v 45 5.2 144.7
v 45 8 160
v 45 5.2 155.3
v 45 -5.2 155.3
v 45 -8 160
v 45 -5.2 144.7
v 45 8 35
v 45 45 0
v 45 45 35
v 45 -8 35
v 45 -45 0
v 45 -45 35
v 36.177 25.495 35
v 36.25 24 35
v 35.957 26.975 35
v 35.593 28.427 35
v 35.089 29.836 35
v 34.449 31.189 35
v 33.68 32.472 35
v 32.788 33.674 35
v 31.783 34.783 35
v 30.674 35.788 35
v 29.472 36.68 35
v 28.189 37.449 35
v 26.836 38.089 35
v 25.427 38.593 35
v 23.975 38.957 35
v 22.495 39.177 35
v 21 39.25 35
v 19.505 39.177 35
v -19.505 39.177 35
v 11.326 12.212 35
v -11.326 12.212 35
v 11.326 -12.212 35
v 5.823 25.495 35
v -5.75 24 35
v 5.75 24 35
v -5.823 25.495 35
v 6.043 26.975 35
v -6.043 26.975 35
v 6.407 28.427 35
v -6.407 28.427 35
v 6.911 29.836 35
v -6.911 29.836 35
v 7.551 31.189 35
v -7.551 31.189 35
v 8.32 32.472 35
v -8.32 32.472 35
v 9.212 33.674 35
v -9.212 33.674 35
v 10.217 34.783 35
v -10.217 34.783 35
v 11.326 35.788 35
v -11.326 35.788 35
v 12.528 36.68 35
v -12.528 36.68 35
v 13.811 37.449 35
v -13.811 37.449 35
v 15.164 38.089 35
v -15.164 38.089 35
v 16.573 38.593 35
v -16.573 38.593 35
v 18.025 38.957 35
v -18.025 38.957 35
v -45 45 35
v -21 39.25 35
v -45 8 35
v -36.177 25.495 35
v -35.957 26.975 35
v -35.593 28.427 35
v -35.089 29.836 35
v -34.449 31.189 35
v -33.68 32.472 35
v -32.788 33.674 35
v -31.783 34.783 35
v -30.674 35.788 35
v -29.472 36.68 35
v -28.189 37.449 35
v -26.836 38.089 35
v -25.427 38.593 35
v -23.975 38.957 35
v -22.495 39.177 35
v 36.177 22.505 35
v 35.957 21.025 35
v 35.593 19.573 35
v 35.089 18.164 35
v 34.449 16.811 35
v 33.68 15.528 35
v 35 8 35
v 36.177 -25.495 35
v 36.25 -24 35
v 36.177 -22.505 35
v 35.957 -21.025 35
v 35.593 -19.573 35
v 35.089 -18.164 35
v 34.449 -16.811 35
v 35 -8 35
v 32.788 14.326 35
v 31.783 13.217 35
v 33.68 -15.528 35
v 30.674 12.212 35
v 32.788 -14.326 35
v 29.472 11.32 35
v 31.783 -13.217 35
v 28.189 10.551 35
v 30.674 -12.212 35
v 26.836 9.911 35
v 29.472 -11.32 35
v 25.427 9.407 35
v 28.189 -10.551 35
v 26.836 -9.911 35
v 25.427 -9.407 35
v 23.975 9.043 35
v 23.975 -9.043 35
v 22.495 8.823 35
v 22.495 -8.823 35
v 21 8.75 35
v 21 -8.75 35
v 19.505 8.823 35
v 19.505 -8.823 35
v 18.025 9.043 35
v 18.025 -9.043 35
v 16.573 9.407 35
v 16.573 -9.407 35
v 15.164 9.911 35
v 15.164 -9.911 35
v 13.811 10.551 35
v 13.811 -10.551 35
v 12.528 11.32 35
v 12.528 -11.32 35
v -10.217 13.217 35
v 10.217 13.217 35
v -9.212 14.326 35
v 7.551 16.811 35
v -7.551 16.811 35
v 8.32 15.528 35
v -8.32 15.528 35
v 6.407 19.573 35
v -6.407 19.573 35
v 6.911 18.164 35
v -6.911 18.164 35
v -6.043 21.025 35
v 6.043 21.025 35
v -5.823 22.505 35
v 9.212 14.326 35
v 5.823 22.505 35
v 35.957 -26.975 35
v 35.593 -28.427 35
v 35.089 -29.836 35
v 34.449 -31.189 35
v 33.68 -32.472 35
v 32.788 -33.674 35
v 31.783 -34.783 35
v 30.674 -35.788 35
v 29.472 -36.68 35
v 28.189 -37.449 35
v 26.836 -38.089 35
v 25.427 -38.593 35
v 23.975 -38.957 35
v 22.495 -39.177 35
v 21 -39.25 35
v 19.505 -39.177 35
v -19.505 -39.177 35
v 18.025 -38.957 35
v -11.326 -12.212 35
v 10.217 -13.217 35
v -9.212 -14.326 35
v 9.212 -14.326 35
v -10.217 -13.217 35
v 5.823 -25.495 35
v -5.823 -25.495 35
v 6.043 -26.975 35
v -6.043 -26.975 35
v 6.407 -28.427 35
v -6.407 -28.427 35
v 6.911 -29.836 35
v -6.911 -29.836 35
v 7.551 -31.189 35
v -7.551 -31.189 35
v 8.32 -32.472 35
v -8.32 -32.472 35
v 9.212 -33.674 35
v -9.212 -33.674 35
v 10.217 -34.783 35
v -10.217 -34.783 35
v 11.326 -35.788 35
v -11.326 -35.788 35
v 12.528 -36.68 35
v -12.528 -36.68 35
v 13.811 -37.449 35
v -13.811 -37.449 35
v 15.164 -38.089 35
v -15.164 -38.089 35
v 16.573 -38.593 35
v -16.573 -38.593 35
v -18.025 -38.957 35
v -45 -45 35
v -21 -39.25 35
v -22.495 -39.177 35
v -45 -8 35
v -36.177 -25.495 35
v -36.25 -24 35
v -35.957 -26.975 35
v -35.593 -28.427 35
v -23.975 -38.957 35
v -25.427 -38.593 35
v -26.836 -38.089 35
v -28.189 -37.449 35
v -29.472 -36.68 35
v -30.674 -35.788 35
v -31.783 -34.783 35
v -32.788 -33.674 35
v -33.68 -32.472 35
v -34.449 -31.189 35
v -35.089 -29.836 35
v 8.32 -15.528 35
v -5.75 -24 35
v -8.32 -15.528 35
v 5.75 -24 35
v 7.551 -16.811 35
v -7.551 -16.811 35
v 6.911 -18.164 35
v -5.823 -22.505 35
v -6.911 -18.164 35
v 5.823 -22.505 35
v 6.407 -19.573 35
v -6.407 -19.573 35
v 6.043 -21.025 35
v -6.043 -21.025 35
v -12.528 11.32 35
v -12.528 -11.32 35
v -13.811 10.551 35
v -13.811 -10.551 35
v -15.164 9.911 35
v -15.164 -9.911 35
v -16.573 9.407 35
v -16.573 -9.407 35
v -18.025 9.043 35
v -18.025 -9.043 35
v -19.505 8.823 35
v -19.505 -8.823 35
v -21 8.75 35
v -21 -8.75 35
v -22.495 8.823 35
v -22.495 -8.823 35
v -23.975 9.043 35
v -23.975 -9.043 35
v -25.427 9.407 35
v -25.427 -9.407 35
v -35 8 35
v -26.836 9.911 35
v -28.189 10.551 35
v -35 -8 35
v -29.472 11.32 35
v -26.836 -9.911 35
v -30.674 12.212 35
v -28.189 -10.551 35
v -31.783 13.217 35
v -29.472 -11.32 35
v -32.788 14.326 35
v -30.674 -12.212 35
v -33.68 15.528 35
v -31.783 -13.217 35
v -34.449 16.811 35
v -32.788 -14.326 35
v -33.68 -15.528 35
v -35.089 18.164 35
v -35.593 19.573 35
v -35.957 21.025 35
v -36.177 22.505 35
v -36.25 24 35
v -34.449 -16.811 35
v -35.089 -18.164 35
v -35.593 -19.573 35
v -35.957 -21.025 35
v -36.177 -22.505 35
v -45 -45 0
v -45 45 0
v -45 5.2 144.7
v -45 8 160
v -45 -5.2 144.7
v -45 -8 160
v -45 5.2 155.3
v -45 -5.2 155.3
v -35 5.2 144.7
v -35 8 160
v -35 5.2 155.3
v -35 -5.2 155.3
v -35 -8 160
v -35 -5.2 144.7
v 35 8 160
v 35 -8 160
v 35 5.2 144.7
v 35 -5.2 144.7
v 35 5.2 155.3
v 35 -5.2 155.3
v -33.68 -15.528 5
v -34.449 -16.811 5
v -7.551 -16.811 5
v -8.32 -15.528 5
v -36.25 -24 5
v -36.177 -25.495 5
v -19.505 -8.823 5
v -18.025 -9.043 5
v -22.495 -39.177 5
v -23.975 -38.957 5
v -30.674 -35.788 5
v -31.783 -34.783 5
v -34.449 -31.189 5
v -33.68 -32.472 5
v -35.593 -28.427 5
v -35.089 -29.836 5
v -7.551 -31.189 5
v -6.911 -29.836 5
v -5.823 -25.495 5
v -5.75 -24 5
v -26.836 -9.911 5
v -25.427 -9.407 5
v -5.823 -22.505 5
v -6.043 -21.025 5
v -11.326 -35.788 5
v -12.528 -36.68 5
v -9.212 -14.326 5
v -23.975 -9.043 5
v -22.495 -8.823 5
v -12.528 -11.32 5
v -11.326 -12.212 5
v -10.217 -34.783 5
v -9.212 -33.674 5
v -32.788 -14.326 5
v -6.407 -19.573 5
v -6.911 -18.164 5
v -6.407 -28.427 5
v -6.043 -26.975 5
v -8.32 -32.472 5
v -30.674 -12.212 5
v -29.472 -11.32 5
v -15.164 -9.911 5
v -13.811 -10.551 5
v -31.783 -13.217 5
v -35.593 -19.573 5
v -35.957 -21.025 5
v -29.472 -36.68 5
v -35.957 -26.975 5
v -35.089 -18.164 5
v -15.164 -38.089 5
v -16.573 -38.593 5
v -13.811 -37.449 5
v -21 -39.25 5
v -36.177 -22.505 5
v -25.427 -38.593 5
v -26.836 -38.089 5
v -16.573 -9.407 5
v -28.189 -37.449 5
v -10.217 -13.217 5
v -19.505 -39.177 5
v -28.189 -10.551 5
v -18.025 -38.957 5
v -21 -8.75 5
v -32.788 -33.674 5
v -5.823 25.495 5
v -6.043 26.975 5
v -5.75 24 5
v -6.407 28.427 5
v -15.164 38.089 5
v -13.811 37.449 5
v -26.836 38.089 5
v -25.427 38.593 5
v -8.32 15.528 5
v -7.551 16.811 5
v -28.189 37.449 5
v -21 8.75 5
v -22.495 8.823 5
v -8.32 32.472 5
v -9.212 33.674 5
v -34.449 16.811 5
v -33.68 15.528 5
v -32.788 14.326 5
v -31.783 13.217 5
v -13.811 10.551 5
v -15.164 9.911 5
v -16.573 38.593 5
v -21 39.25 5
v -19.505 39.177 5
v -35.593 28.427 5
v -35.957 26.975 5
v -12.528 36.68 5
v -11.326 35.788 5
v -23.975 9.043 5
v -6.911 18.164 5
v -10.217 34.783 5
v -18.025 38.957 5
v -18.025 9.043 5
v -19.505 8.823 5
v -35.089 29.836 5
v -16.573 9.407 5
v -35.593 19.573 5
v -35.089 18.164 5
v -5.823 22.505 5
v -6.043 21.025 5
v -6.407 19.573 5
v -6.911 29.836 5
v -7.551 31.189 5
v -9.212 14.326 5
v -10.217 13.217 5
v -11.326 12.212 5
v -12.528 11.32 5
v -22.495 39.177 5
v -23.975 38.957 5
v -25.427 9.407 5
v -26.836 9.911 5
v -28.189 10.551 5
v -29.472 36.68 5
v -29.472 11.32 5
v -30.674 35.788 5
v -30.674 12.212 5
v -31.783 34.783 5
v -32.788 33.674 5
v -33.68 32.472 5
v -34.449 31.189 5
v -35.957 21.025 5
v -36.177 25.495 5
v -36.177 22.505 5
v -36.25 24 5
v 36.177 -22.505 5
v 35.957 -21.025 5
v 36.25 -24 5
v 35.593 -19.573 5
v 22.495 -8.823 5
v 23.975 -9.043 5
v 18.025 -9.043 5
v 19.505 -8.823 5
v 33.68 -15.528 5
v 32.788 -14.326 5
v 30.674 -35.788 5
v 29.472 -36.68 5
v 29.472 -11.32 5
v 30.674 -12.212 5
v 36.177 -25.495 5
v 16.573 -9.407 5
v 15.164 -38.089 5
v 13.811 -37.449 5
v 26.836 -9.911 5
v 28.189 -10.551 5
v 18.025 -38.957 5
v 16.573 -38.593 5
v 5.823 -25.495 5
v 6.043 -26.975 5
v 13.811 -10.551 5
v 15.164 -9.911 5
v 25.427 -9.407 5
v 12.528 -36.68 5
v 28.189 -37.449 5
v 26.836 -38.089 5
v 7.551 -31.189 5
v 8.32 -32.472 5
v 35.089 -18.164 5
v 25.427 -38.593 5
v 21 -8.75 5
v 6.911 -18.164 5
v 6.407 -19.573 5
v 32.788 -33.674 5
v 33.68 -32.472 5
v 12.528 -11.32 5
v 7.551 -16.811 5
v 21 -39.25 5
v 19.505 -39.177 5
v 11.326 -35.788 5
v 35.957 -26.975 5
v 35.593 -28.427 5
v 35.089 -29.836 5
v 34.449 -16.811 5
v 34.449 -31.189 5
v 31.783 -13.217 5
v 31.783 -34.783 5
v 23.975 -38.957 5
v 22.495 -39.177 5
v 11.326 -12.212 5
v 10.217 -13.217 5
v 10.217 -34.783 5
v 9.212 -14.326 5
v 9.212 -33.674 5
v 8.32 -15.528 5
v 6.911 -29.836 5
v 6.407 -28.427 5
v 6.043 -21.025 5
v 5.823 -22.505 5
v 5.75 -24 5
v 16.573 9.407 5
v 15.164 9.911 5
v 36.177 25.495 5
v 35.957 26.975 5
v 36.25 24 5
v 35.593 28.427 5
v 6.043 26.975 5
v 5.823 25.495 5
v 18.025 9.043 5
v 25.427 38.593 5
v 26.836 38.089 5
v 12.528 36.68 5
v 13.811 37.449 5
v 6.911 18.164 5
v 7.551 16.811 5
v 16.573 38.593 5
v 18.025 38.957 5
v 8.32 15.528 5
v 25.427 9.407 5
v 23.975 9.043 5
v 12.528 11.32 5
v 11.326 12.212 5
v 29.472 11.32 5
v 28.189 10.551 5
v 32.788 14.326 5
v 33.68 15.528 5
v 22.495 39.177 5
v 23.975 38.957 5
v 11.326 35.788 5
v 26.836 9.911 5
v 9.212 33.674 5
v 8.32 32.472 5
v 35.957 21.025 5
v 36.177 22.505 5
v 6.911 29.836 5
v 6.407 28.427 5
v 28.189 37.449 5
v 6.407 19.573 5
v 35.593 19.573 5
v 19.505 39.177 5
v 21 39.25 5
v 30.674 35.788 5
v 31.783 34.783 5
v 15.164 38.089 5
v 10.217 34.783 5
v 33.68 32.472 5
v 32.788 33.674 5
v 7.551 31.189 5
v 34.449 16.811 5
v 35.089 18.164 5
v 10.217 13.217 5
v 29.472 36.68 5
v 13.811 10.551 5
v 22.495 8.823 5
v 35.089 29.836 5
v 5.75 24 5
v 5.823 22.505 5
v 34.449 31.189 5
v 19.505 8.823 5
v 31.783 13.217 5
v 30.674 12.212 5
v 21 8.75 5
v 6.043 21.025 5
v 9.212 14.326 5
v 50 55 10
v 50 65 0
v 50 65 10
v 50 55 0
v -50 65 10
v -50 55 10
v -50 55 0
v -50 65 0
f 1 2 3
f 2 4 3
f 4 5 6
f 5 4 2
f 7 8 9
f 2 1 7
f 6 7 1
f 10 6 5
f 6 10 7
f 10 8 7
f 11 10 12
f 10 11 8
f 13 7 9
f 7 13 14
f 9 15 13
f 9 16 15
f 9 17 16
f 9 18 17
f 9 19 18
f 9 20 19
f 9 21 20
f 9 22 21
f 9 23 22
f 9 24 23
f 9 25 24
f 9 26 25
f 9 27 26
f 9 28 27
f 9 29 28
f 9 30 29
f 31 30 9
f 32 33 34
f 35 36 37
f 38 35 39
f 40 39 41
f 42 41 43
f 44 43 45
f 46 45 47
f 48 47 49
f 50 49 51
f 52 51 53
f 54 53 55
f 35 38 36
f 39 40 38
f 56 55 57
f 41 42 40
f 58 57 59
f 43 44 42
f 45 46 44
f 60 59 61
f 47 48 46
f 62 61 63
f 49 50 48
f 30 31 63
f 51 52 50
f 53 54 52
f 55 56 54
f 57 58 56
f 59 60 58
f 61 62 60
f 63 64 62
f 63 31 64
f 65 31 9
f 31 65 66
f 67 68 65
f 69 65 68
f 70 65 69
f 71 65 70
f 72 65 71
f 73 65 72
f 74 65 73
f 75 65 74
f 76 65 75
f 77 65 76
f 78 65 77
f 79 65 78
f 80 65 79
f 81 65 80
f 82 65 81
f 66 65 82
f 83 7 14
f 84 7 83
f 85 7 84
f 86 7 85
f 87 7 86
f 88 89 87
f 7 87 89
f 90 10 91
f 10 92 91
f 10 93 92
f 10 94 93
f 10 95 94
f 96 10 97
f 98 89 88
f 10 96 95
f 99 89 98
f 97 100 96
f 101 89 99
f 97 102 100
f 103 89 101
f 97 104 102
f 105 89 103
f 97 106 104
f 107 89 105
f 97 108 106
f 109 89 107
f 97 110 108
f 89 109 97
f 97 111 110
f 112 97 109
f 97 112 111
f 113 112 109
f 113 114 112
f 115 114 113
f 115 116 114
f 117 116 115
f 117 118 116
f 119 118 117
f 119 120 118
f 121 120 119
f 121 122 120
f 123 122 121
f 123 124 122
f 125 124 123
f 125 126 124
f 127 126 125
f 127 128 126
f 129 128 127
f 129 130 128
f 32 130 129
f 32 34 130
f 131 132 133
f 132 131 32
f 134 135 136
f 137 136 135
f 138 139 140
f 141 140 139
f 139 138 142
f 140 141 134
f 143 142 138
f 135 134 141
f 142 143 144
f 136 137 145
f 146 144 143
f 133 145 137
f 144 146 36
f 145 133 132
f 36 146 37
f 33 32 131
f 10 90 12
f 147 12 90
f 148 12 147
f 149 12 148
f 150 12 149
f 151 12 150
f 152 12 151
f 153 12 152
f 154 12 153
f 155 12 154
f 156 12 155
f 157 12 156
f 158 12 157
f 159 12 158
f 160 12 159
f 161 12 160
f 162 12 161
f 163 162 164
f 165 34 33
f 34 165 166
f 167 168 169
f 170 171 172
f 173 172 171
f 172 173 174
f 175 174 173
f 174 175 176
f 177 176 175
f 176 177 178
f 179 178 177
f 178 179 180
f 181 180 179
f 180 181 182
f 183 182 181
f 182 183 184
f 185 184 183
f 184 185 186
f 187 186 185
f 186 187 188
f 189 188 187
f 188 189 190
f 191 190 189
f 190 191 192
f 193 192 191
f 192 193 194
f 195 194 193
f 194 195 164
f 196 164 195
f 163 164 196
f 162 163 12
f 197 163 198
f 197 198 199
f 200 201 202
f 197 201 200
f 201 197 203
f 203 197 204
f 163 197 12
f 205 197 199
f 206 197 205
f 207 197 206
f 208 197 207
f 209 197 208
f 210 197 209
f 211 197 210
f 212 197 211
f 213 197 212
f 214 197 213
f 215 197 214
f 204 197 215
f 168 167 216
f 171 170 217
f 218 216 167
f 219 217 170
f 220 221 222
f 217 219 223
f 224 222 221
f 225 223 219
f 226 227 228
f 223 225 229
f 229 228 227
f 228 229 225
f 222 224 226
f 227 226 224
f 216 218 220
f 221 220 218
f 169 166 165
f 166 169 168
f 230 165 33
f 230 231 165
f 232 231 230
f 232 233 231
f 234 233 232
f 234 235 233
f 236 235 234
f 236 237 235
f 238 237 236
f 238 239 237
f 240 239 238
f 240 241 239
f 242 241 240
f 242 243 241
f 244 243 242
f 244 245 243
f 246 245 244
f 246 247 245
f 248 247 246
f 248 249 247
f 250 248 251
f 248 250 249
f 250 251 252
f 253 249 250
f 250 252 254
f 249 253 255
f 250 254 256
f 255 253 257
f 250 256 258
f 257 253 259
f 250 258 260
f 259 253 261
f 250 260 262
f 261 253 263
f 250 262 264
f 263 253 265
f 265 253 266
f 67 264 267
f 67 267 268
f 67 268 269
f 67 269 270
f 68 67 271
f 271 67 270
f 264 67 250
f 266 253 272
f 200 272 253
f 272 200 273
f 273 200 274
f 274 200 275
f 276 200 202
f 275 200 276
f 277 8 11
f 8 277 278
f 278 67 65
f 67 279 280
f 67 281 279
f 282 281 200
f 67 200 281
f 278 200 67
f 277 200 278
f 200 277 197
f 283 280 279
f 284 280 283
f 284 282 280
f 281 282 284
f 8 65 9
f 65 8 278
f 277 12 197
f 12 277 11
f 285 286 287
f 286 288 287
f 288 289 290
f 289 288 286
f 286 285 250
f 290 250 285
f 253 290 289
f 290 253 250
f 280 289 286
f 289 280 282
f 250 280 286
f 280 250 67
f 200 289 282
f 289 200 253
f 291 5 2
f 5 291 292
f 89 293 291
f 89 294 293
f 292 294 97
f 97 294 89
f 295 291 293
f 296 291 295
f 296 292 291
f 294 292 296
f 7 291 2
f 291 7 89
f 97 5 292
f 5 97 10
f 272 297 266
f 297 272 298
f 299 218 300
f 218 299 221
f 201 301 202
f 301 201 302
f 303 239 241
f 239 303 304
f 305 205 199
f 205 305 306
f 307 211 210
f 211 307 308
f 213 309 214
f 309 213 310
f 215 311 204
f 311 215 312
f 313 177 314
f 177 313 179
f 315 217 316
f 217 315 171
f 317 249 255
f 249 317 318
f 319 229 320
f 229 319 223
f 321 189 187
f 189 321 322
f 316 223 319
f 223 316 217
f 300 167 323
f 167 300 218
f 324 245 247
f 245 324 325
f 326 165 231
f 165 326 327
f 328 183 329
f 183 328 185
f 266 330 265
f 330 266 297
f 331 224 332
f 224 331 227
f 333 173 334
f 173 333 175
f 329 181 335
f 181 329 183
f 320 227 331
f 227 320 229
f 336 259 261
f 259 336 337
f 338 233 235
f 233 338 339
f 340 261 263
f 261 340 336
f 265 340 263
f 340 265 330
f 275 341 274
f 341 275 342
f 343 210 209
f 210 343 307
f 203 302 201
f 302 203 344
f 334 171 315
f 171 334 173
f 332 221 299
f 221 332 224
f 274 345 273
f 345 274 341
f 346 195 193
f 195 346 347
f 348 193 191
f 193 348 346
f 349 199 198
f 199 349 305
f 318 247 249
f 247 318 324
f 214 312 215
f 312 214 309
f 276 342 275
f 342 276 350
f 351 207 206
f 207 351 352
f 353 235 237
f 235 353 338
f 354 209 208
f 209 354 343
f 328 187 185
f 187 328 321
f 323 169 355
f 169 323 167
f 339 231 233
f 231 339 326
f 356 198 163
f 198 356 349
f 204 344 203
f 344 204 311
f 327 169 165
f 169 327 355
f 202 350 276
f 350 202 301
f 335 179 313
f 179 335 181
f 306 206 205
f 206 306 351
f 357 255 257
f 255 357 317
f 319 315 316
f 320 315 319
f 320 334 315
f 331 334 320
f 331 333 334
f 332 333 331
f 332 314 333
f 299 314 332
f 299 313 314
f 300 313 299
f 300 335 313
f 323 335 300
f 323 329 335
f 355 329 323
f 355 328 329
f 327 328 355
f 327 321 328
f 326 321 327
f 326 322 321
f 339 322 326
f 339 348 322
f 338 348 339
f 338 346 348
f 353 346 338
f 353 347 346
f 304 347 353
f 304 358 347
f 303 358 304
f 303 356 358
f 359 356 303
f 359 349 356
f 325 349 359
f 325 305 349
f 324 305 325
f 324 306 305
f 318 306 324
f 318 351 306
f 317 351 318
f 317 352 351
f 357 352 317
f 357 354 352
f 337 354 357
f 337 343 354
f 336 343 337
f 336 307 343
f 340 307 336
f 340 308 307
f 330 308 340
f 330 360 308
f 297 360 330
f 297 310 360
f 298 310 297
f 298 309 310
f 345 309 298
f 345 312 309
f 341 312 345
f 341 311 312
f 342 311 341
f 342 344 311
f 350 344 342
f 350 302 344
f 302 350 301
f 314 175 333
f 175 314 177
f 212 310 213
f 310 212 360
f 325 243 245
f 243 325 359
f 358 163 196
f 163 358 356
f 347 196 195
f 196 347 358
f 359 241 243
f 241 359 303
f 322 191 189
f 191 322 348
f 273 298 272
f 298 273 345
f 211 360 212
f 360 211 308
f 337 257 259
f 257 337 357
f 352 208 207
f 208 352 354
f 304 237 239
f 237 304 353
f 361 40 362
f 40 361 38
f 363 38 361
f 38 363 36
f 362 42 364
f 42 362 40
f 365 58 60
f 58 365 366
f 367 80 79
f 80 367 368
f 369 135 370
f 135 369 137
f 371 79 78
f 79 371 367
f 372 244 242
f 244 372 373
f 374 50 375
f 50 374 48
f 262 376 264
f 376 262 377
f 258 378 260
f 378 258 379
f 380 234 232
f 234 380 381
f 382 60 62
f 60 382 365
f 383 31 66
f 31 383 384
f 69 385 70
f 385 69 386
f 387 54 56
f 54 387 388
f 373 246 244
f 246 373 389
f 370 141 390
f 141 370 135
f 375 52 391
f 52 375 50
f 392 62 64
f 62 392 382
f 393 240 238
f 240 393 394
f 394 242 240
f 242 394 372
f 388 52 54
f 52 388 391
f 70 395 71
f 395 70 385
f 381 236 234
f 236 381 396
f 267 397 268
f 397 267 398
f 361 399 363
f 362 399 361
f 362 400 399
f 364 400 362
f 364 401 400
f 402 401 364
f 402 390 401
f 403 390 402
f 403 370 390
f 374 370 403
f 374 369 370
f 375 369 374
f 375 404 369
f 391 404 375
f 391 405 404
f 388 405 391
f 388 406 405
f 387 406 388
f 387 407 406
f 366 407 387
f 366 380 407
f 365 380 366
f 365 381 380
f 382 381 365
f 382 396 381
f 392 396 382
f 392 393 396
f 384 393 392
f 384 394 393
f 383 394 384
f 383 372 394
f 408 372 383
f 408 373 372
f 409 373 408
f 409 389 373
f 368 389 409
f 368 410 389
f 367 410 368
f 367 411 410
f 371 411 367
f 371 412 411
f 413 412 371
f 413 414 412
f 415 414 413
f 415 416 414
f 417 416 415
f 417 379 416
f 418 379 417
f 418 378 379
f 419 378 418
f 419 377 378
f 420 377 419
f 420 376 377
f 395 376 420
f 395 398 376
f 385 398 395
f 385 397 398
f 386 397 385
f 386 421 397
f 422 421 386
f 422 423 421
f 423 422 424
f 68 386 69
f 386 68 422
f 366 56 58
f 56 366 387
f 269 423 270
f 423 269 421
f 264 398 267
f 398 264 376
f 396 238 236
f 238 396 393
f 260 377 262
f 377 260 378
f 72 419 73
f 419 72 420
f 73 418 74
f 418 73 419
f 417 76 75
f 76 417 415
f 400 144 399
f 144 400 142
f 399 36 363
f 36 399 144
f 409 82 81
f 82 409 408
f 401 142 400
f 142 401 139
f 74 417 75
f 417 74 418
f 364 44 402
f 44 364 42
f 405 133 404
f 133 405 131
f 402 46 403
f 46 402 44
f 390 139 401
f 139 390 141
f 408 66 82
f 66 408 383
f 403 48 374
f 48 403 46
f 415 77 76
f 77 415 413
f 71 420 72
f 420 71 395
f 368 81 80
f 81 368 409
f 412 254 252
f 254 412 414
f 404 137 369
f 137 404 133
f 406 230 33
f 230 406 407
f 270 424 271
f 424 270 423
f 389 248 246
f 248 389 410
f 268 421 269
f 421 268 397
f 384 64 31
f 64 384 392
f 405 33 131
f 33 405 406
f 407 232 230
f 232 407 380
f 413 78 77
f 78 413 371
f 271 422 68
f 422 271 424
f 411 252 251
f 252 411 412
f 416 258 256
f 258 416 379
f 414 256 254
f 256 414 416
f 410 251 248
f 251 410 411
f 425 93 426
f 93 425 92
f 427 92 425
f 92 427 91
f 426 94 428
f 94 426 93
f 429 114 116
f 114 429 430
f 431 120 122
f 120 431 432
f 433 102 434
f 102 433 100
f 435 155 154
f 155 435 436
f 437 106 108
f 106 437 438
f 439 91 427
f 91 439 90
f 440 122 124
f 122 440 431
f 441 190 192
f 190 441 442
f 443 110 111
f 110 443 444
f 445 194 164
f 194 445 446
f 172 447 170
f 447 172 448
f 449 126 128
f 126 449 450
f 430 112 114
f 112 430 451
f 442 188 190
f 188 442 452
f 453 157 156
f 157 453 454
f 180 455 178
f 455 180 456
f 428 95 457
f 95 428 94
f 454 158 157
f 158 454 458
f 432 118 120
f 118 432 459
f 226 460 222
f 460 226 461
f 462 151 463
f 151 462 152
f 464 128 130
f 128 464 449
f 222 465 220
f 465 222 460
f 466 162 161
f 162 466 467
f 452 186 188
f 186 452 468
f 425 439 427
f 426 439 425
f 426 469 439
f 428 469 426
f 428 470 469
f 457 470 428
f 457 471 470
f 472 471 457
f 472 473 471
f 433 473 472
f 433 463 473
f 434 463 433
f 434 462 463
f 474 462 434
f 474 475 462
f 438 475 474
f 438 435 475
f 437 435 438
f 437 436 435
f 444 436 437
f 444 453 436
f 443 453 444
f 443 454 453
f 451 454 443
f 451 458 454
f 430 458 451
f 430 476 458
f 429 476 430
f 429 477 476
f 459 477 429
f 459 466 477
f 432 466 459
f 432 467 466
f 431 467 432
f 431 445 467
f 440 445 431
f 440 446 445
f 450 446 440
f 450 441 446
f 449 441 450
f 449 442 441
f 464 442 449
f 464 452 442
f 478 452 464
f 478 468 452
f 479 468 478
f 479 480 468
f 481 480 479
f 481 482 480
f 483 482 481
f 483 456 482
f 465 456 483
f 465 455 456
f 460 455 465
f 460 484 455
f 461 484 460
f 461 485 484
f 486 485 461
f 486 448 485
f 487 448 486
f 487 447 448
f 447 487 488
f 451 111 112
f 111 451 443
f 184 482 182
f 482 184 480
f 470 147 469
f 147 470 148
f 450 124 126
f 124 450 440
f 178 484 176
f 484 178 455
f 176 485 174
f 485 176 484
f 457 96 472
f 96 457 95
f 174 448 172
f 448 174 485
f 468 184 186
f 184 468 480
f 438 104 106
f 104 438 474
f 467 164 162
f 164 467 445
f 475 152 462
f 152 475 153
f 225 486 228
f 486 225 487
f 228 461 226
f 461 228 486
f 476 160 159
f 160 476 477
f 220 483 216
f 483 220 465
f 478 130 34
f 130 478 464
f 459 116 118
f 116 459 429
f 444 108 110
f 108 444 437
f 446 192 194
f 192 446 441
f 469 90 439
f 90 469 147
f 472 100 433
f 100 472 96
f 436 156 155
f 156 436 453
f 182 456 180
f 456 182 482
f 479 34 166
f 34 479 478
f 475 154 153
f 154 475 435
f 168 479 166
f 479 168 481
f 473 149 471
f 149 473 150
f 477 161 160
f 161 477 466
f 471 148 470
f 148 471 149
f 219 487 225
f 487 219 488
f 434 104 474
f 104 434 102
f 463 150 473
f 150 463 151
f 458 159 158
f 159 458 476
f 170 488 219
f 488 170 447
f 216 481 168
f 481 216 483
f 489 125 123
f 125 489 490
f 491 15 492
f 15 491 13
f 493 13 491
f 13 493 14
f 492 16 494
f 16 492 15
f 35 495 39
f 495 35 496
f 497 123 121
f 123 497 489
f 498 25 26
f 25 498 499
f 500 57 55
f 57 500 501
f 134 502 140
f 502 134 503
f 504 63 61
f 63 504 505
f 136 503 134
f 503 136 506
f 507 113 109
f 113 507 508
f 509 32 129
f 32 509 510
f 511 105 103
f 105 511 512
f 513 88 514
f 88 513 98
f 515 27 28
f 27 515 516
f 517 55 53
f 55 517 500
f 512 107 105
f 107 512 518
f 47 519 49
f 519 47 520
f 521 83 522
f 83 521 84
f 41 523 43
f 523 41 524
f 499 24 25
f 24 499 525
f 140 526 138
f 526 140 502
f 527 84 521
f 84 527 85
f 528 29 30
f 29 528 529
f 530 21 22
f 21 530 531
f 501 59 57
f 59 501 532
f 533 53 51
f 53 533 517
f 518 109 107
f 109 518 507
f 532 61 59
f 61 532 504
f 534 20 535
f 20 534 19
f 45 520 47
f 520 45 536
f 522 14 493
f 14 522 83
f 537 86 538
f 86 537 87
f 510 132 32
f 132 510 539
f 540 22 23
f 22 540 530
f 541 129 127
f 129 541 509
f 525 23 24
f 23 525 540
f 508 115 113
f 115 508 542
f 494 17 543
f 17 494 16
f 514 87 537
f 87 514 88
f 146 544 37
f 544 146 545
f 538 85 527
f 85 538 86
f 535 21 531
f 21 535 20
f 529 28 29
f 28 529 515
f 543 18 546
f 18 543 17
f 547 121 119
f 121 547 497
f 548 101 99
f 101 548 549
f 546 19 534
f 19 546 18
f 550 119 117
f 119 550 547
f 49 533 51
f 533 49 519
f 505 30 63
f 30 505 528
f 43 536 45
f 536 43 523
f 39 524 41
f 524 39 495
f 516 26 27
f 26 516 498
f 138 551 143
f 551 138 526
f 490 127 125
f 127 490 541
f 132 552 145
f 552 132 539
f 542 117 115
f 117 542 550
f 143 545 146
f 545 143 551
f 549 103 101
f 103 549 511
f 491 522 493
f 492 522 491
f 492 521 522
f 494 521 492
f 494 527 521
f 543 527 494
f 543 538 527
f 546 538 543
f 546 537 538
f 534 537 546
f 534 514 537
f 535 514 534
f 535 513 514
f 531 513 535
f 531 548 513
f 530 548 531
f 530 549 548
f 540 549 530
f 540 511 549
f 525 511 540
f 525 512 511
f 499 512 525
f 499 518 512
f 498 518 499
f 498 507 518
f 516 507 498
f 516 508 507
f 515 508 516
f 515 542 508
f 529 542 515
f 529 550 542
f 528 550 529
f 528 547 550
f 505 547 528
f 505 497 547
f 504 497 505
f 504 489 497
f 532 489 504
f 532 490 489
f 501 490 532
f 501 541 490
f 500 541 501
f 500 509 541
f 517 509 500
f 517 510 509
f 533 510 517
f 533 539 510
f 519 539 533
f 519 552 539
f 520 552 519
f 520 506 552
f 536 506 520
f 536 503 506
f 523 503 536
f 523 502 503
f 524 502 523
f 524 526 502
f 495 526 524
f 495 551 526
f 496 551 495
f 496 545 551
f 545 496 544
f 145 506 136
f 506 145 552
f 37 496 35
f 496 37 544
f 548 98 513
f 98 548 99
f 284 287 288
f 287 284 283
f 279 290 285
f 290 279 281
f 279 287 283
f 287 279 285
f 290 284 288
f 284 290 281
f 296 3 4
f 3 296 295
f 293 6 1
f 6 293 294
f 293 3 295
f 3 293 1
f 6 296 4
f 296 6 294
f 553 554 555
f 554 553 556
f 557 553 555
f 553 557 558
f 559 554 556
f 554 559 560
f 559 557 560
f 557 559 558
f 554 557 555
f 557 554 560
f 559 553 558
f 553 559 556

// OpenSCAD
// Dimensions
base_x = 90;         // X dimension of base
base_y = 90;         // Y dimension of base
base_z = 35;         // Z dimension (height) of base
post_thickness_x = 10;  // X thickness of posts
post_width_y = 16;   // Y width of posts
post_height_z = 160; // Z height of posts
seat_diameter = 30.5; // Diameter of conical tube seats
seat_depth = 30;     // Depth of blind seats
seat_x1 = -21;       // X position of first two seats
seat_x2 = 21;        // X position of second two seats
seat_y1 = -24;       // Y position of first pair of seats
seat_y2 = 24;        // Y position of second pair of seats
hole_size = 10.4;    // Size of square holes through posts
hole_z_center = 150; // Z center of holes through posts
handle_x = 100;      // X length of handle bar
handle_y = 10;       // Y width of handle bar
handle_z = 10;       // Z height of handle bar
handle_y_pos = 60;   // Y position of handle bar center

// Part 1: Base block with posts
difference() {
  union() {
    // Base block: 90 x 90 x 35 mm, centered at origin in X/Y, resting on bed in Z
    translate([0, 0, base_z/2]) cube([base_x, base_y, base_z], center=true);
    
    // Left post: 10 x 16 x 160 mm at left end
    translate([-45, -8, 0]) cube([post_thickness_x, post_width_y, post_height_z]);
    
    // Right post: 10 x 16 x 160 mm at right end
    translate([35, -8, 0]) cube([post_thickness_x, post_width_y, post_height_z]);
  }
  
  // Blind seats for conical tubes: 30.5 mm diameter, 30 mm deep
  for (x = [seat_x1, seat_x2]) {
    for (y = [seat_y1, seat_y2]) {
      translate([x, y, 5]) {
        cylinder(h=seat_depth+0.1, d=seat_diameter, $fn=64);
      }
    }
  }
  
  // Holes through posts: 10.4 x 10.4 mm square, straight through along X
  // Left post hole
  translate([-46, -5.2, hole_z_center - hole_size/2 - 0.1]) {
    cube([12, hole_size, hole_size + 0.2]);
  }
  
  // Right post hole
  translate([34, -5.2, hole_z_center - hole_size/2 - 0.1]) {
    cube([12, hole_size, hole_size + 0.2]);
  }
}

// Part 2: Handle bar: 10 x 10 mm square, 100 mm long, lying on bed
translate([0, handle_y_pos, handle_z/2]) {
  cube([handle_x, handle_y, handle_z], center=true);
}
